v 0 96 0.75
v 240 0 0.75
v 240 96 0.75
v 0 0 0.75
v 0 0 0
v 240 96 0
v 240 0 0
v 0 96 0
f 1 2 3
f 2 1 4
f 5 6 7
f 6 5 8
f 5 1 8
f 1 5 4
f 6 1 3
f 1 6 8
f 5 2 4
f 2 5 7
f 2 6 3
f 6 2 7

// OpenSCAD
// file: lumber.scad
use <utilities.scad>;

// Stick
module 2x4x8(cut=[0, 0, 0]) {
    echo("2x4x8");
    cube([inches(1, 1/2) - cut[0], inches(3, 1/2) - cut[1], feet(8) - cut[2]]);
};

module 2x6x8(cut=[0, 0, 0]) {
    echo("2x6x8");
    cube([inches(1, 1/2) - cut[0], inches(5, 1/2) - cut[1], feet(8) - cut[2]]);
};

// Sheet
module 4x8x34ths(cut=[0, 0, 0]) {
    echo("4x8x3/4");
    cube([feet(4) - cut[0], feet(8) - cut[1], inches(0, 3/4) - cut[2]]);
};

2x4x8();

translate([24, 0, 0])
    2x6x8();

translate([48, 0, 0])
    4x8x34ths();
// file: utilities.scad
function feet(f) = f * 12;
function inches(i=0, f=0) = i+f; 
// main file
use <utilities.scad>;
use <lumber.scad>;

module sheet_floor(start_height=0) {
    // Takes four sheets of plywood
    for (x = [0:1:4]) {
        translate([x * feet(4), 0, start_height])
            4x8x34ths();
    }
}
    
sheet_floor();
